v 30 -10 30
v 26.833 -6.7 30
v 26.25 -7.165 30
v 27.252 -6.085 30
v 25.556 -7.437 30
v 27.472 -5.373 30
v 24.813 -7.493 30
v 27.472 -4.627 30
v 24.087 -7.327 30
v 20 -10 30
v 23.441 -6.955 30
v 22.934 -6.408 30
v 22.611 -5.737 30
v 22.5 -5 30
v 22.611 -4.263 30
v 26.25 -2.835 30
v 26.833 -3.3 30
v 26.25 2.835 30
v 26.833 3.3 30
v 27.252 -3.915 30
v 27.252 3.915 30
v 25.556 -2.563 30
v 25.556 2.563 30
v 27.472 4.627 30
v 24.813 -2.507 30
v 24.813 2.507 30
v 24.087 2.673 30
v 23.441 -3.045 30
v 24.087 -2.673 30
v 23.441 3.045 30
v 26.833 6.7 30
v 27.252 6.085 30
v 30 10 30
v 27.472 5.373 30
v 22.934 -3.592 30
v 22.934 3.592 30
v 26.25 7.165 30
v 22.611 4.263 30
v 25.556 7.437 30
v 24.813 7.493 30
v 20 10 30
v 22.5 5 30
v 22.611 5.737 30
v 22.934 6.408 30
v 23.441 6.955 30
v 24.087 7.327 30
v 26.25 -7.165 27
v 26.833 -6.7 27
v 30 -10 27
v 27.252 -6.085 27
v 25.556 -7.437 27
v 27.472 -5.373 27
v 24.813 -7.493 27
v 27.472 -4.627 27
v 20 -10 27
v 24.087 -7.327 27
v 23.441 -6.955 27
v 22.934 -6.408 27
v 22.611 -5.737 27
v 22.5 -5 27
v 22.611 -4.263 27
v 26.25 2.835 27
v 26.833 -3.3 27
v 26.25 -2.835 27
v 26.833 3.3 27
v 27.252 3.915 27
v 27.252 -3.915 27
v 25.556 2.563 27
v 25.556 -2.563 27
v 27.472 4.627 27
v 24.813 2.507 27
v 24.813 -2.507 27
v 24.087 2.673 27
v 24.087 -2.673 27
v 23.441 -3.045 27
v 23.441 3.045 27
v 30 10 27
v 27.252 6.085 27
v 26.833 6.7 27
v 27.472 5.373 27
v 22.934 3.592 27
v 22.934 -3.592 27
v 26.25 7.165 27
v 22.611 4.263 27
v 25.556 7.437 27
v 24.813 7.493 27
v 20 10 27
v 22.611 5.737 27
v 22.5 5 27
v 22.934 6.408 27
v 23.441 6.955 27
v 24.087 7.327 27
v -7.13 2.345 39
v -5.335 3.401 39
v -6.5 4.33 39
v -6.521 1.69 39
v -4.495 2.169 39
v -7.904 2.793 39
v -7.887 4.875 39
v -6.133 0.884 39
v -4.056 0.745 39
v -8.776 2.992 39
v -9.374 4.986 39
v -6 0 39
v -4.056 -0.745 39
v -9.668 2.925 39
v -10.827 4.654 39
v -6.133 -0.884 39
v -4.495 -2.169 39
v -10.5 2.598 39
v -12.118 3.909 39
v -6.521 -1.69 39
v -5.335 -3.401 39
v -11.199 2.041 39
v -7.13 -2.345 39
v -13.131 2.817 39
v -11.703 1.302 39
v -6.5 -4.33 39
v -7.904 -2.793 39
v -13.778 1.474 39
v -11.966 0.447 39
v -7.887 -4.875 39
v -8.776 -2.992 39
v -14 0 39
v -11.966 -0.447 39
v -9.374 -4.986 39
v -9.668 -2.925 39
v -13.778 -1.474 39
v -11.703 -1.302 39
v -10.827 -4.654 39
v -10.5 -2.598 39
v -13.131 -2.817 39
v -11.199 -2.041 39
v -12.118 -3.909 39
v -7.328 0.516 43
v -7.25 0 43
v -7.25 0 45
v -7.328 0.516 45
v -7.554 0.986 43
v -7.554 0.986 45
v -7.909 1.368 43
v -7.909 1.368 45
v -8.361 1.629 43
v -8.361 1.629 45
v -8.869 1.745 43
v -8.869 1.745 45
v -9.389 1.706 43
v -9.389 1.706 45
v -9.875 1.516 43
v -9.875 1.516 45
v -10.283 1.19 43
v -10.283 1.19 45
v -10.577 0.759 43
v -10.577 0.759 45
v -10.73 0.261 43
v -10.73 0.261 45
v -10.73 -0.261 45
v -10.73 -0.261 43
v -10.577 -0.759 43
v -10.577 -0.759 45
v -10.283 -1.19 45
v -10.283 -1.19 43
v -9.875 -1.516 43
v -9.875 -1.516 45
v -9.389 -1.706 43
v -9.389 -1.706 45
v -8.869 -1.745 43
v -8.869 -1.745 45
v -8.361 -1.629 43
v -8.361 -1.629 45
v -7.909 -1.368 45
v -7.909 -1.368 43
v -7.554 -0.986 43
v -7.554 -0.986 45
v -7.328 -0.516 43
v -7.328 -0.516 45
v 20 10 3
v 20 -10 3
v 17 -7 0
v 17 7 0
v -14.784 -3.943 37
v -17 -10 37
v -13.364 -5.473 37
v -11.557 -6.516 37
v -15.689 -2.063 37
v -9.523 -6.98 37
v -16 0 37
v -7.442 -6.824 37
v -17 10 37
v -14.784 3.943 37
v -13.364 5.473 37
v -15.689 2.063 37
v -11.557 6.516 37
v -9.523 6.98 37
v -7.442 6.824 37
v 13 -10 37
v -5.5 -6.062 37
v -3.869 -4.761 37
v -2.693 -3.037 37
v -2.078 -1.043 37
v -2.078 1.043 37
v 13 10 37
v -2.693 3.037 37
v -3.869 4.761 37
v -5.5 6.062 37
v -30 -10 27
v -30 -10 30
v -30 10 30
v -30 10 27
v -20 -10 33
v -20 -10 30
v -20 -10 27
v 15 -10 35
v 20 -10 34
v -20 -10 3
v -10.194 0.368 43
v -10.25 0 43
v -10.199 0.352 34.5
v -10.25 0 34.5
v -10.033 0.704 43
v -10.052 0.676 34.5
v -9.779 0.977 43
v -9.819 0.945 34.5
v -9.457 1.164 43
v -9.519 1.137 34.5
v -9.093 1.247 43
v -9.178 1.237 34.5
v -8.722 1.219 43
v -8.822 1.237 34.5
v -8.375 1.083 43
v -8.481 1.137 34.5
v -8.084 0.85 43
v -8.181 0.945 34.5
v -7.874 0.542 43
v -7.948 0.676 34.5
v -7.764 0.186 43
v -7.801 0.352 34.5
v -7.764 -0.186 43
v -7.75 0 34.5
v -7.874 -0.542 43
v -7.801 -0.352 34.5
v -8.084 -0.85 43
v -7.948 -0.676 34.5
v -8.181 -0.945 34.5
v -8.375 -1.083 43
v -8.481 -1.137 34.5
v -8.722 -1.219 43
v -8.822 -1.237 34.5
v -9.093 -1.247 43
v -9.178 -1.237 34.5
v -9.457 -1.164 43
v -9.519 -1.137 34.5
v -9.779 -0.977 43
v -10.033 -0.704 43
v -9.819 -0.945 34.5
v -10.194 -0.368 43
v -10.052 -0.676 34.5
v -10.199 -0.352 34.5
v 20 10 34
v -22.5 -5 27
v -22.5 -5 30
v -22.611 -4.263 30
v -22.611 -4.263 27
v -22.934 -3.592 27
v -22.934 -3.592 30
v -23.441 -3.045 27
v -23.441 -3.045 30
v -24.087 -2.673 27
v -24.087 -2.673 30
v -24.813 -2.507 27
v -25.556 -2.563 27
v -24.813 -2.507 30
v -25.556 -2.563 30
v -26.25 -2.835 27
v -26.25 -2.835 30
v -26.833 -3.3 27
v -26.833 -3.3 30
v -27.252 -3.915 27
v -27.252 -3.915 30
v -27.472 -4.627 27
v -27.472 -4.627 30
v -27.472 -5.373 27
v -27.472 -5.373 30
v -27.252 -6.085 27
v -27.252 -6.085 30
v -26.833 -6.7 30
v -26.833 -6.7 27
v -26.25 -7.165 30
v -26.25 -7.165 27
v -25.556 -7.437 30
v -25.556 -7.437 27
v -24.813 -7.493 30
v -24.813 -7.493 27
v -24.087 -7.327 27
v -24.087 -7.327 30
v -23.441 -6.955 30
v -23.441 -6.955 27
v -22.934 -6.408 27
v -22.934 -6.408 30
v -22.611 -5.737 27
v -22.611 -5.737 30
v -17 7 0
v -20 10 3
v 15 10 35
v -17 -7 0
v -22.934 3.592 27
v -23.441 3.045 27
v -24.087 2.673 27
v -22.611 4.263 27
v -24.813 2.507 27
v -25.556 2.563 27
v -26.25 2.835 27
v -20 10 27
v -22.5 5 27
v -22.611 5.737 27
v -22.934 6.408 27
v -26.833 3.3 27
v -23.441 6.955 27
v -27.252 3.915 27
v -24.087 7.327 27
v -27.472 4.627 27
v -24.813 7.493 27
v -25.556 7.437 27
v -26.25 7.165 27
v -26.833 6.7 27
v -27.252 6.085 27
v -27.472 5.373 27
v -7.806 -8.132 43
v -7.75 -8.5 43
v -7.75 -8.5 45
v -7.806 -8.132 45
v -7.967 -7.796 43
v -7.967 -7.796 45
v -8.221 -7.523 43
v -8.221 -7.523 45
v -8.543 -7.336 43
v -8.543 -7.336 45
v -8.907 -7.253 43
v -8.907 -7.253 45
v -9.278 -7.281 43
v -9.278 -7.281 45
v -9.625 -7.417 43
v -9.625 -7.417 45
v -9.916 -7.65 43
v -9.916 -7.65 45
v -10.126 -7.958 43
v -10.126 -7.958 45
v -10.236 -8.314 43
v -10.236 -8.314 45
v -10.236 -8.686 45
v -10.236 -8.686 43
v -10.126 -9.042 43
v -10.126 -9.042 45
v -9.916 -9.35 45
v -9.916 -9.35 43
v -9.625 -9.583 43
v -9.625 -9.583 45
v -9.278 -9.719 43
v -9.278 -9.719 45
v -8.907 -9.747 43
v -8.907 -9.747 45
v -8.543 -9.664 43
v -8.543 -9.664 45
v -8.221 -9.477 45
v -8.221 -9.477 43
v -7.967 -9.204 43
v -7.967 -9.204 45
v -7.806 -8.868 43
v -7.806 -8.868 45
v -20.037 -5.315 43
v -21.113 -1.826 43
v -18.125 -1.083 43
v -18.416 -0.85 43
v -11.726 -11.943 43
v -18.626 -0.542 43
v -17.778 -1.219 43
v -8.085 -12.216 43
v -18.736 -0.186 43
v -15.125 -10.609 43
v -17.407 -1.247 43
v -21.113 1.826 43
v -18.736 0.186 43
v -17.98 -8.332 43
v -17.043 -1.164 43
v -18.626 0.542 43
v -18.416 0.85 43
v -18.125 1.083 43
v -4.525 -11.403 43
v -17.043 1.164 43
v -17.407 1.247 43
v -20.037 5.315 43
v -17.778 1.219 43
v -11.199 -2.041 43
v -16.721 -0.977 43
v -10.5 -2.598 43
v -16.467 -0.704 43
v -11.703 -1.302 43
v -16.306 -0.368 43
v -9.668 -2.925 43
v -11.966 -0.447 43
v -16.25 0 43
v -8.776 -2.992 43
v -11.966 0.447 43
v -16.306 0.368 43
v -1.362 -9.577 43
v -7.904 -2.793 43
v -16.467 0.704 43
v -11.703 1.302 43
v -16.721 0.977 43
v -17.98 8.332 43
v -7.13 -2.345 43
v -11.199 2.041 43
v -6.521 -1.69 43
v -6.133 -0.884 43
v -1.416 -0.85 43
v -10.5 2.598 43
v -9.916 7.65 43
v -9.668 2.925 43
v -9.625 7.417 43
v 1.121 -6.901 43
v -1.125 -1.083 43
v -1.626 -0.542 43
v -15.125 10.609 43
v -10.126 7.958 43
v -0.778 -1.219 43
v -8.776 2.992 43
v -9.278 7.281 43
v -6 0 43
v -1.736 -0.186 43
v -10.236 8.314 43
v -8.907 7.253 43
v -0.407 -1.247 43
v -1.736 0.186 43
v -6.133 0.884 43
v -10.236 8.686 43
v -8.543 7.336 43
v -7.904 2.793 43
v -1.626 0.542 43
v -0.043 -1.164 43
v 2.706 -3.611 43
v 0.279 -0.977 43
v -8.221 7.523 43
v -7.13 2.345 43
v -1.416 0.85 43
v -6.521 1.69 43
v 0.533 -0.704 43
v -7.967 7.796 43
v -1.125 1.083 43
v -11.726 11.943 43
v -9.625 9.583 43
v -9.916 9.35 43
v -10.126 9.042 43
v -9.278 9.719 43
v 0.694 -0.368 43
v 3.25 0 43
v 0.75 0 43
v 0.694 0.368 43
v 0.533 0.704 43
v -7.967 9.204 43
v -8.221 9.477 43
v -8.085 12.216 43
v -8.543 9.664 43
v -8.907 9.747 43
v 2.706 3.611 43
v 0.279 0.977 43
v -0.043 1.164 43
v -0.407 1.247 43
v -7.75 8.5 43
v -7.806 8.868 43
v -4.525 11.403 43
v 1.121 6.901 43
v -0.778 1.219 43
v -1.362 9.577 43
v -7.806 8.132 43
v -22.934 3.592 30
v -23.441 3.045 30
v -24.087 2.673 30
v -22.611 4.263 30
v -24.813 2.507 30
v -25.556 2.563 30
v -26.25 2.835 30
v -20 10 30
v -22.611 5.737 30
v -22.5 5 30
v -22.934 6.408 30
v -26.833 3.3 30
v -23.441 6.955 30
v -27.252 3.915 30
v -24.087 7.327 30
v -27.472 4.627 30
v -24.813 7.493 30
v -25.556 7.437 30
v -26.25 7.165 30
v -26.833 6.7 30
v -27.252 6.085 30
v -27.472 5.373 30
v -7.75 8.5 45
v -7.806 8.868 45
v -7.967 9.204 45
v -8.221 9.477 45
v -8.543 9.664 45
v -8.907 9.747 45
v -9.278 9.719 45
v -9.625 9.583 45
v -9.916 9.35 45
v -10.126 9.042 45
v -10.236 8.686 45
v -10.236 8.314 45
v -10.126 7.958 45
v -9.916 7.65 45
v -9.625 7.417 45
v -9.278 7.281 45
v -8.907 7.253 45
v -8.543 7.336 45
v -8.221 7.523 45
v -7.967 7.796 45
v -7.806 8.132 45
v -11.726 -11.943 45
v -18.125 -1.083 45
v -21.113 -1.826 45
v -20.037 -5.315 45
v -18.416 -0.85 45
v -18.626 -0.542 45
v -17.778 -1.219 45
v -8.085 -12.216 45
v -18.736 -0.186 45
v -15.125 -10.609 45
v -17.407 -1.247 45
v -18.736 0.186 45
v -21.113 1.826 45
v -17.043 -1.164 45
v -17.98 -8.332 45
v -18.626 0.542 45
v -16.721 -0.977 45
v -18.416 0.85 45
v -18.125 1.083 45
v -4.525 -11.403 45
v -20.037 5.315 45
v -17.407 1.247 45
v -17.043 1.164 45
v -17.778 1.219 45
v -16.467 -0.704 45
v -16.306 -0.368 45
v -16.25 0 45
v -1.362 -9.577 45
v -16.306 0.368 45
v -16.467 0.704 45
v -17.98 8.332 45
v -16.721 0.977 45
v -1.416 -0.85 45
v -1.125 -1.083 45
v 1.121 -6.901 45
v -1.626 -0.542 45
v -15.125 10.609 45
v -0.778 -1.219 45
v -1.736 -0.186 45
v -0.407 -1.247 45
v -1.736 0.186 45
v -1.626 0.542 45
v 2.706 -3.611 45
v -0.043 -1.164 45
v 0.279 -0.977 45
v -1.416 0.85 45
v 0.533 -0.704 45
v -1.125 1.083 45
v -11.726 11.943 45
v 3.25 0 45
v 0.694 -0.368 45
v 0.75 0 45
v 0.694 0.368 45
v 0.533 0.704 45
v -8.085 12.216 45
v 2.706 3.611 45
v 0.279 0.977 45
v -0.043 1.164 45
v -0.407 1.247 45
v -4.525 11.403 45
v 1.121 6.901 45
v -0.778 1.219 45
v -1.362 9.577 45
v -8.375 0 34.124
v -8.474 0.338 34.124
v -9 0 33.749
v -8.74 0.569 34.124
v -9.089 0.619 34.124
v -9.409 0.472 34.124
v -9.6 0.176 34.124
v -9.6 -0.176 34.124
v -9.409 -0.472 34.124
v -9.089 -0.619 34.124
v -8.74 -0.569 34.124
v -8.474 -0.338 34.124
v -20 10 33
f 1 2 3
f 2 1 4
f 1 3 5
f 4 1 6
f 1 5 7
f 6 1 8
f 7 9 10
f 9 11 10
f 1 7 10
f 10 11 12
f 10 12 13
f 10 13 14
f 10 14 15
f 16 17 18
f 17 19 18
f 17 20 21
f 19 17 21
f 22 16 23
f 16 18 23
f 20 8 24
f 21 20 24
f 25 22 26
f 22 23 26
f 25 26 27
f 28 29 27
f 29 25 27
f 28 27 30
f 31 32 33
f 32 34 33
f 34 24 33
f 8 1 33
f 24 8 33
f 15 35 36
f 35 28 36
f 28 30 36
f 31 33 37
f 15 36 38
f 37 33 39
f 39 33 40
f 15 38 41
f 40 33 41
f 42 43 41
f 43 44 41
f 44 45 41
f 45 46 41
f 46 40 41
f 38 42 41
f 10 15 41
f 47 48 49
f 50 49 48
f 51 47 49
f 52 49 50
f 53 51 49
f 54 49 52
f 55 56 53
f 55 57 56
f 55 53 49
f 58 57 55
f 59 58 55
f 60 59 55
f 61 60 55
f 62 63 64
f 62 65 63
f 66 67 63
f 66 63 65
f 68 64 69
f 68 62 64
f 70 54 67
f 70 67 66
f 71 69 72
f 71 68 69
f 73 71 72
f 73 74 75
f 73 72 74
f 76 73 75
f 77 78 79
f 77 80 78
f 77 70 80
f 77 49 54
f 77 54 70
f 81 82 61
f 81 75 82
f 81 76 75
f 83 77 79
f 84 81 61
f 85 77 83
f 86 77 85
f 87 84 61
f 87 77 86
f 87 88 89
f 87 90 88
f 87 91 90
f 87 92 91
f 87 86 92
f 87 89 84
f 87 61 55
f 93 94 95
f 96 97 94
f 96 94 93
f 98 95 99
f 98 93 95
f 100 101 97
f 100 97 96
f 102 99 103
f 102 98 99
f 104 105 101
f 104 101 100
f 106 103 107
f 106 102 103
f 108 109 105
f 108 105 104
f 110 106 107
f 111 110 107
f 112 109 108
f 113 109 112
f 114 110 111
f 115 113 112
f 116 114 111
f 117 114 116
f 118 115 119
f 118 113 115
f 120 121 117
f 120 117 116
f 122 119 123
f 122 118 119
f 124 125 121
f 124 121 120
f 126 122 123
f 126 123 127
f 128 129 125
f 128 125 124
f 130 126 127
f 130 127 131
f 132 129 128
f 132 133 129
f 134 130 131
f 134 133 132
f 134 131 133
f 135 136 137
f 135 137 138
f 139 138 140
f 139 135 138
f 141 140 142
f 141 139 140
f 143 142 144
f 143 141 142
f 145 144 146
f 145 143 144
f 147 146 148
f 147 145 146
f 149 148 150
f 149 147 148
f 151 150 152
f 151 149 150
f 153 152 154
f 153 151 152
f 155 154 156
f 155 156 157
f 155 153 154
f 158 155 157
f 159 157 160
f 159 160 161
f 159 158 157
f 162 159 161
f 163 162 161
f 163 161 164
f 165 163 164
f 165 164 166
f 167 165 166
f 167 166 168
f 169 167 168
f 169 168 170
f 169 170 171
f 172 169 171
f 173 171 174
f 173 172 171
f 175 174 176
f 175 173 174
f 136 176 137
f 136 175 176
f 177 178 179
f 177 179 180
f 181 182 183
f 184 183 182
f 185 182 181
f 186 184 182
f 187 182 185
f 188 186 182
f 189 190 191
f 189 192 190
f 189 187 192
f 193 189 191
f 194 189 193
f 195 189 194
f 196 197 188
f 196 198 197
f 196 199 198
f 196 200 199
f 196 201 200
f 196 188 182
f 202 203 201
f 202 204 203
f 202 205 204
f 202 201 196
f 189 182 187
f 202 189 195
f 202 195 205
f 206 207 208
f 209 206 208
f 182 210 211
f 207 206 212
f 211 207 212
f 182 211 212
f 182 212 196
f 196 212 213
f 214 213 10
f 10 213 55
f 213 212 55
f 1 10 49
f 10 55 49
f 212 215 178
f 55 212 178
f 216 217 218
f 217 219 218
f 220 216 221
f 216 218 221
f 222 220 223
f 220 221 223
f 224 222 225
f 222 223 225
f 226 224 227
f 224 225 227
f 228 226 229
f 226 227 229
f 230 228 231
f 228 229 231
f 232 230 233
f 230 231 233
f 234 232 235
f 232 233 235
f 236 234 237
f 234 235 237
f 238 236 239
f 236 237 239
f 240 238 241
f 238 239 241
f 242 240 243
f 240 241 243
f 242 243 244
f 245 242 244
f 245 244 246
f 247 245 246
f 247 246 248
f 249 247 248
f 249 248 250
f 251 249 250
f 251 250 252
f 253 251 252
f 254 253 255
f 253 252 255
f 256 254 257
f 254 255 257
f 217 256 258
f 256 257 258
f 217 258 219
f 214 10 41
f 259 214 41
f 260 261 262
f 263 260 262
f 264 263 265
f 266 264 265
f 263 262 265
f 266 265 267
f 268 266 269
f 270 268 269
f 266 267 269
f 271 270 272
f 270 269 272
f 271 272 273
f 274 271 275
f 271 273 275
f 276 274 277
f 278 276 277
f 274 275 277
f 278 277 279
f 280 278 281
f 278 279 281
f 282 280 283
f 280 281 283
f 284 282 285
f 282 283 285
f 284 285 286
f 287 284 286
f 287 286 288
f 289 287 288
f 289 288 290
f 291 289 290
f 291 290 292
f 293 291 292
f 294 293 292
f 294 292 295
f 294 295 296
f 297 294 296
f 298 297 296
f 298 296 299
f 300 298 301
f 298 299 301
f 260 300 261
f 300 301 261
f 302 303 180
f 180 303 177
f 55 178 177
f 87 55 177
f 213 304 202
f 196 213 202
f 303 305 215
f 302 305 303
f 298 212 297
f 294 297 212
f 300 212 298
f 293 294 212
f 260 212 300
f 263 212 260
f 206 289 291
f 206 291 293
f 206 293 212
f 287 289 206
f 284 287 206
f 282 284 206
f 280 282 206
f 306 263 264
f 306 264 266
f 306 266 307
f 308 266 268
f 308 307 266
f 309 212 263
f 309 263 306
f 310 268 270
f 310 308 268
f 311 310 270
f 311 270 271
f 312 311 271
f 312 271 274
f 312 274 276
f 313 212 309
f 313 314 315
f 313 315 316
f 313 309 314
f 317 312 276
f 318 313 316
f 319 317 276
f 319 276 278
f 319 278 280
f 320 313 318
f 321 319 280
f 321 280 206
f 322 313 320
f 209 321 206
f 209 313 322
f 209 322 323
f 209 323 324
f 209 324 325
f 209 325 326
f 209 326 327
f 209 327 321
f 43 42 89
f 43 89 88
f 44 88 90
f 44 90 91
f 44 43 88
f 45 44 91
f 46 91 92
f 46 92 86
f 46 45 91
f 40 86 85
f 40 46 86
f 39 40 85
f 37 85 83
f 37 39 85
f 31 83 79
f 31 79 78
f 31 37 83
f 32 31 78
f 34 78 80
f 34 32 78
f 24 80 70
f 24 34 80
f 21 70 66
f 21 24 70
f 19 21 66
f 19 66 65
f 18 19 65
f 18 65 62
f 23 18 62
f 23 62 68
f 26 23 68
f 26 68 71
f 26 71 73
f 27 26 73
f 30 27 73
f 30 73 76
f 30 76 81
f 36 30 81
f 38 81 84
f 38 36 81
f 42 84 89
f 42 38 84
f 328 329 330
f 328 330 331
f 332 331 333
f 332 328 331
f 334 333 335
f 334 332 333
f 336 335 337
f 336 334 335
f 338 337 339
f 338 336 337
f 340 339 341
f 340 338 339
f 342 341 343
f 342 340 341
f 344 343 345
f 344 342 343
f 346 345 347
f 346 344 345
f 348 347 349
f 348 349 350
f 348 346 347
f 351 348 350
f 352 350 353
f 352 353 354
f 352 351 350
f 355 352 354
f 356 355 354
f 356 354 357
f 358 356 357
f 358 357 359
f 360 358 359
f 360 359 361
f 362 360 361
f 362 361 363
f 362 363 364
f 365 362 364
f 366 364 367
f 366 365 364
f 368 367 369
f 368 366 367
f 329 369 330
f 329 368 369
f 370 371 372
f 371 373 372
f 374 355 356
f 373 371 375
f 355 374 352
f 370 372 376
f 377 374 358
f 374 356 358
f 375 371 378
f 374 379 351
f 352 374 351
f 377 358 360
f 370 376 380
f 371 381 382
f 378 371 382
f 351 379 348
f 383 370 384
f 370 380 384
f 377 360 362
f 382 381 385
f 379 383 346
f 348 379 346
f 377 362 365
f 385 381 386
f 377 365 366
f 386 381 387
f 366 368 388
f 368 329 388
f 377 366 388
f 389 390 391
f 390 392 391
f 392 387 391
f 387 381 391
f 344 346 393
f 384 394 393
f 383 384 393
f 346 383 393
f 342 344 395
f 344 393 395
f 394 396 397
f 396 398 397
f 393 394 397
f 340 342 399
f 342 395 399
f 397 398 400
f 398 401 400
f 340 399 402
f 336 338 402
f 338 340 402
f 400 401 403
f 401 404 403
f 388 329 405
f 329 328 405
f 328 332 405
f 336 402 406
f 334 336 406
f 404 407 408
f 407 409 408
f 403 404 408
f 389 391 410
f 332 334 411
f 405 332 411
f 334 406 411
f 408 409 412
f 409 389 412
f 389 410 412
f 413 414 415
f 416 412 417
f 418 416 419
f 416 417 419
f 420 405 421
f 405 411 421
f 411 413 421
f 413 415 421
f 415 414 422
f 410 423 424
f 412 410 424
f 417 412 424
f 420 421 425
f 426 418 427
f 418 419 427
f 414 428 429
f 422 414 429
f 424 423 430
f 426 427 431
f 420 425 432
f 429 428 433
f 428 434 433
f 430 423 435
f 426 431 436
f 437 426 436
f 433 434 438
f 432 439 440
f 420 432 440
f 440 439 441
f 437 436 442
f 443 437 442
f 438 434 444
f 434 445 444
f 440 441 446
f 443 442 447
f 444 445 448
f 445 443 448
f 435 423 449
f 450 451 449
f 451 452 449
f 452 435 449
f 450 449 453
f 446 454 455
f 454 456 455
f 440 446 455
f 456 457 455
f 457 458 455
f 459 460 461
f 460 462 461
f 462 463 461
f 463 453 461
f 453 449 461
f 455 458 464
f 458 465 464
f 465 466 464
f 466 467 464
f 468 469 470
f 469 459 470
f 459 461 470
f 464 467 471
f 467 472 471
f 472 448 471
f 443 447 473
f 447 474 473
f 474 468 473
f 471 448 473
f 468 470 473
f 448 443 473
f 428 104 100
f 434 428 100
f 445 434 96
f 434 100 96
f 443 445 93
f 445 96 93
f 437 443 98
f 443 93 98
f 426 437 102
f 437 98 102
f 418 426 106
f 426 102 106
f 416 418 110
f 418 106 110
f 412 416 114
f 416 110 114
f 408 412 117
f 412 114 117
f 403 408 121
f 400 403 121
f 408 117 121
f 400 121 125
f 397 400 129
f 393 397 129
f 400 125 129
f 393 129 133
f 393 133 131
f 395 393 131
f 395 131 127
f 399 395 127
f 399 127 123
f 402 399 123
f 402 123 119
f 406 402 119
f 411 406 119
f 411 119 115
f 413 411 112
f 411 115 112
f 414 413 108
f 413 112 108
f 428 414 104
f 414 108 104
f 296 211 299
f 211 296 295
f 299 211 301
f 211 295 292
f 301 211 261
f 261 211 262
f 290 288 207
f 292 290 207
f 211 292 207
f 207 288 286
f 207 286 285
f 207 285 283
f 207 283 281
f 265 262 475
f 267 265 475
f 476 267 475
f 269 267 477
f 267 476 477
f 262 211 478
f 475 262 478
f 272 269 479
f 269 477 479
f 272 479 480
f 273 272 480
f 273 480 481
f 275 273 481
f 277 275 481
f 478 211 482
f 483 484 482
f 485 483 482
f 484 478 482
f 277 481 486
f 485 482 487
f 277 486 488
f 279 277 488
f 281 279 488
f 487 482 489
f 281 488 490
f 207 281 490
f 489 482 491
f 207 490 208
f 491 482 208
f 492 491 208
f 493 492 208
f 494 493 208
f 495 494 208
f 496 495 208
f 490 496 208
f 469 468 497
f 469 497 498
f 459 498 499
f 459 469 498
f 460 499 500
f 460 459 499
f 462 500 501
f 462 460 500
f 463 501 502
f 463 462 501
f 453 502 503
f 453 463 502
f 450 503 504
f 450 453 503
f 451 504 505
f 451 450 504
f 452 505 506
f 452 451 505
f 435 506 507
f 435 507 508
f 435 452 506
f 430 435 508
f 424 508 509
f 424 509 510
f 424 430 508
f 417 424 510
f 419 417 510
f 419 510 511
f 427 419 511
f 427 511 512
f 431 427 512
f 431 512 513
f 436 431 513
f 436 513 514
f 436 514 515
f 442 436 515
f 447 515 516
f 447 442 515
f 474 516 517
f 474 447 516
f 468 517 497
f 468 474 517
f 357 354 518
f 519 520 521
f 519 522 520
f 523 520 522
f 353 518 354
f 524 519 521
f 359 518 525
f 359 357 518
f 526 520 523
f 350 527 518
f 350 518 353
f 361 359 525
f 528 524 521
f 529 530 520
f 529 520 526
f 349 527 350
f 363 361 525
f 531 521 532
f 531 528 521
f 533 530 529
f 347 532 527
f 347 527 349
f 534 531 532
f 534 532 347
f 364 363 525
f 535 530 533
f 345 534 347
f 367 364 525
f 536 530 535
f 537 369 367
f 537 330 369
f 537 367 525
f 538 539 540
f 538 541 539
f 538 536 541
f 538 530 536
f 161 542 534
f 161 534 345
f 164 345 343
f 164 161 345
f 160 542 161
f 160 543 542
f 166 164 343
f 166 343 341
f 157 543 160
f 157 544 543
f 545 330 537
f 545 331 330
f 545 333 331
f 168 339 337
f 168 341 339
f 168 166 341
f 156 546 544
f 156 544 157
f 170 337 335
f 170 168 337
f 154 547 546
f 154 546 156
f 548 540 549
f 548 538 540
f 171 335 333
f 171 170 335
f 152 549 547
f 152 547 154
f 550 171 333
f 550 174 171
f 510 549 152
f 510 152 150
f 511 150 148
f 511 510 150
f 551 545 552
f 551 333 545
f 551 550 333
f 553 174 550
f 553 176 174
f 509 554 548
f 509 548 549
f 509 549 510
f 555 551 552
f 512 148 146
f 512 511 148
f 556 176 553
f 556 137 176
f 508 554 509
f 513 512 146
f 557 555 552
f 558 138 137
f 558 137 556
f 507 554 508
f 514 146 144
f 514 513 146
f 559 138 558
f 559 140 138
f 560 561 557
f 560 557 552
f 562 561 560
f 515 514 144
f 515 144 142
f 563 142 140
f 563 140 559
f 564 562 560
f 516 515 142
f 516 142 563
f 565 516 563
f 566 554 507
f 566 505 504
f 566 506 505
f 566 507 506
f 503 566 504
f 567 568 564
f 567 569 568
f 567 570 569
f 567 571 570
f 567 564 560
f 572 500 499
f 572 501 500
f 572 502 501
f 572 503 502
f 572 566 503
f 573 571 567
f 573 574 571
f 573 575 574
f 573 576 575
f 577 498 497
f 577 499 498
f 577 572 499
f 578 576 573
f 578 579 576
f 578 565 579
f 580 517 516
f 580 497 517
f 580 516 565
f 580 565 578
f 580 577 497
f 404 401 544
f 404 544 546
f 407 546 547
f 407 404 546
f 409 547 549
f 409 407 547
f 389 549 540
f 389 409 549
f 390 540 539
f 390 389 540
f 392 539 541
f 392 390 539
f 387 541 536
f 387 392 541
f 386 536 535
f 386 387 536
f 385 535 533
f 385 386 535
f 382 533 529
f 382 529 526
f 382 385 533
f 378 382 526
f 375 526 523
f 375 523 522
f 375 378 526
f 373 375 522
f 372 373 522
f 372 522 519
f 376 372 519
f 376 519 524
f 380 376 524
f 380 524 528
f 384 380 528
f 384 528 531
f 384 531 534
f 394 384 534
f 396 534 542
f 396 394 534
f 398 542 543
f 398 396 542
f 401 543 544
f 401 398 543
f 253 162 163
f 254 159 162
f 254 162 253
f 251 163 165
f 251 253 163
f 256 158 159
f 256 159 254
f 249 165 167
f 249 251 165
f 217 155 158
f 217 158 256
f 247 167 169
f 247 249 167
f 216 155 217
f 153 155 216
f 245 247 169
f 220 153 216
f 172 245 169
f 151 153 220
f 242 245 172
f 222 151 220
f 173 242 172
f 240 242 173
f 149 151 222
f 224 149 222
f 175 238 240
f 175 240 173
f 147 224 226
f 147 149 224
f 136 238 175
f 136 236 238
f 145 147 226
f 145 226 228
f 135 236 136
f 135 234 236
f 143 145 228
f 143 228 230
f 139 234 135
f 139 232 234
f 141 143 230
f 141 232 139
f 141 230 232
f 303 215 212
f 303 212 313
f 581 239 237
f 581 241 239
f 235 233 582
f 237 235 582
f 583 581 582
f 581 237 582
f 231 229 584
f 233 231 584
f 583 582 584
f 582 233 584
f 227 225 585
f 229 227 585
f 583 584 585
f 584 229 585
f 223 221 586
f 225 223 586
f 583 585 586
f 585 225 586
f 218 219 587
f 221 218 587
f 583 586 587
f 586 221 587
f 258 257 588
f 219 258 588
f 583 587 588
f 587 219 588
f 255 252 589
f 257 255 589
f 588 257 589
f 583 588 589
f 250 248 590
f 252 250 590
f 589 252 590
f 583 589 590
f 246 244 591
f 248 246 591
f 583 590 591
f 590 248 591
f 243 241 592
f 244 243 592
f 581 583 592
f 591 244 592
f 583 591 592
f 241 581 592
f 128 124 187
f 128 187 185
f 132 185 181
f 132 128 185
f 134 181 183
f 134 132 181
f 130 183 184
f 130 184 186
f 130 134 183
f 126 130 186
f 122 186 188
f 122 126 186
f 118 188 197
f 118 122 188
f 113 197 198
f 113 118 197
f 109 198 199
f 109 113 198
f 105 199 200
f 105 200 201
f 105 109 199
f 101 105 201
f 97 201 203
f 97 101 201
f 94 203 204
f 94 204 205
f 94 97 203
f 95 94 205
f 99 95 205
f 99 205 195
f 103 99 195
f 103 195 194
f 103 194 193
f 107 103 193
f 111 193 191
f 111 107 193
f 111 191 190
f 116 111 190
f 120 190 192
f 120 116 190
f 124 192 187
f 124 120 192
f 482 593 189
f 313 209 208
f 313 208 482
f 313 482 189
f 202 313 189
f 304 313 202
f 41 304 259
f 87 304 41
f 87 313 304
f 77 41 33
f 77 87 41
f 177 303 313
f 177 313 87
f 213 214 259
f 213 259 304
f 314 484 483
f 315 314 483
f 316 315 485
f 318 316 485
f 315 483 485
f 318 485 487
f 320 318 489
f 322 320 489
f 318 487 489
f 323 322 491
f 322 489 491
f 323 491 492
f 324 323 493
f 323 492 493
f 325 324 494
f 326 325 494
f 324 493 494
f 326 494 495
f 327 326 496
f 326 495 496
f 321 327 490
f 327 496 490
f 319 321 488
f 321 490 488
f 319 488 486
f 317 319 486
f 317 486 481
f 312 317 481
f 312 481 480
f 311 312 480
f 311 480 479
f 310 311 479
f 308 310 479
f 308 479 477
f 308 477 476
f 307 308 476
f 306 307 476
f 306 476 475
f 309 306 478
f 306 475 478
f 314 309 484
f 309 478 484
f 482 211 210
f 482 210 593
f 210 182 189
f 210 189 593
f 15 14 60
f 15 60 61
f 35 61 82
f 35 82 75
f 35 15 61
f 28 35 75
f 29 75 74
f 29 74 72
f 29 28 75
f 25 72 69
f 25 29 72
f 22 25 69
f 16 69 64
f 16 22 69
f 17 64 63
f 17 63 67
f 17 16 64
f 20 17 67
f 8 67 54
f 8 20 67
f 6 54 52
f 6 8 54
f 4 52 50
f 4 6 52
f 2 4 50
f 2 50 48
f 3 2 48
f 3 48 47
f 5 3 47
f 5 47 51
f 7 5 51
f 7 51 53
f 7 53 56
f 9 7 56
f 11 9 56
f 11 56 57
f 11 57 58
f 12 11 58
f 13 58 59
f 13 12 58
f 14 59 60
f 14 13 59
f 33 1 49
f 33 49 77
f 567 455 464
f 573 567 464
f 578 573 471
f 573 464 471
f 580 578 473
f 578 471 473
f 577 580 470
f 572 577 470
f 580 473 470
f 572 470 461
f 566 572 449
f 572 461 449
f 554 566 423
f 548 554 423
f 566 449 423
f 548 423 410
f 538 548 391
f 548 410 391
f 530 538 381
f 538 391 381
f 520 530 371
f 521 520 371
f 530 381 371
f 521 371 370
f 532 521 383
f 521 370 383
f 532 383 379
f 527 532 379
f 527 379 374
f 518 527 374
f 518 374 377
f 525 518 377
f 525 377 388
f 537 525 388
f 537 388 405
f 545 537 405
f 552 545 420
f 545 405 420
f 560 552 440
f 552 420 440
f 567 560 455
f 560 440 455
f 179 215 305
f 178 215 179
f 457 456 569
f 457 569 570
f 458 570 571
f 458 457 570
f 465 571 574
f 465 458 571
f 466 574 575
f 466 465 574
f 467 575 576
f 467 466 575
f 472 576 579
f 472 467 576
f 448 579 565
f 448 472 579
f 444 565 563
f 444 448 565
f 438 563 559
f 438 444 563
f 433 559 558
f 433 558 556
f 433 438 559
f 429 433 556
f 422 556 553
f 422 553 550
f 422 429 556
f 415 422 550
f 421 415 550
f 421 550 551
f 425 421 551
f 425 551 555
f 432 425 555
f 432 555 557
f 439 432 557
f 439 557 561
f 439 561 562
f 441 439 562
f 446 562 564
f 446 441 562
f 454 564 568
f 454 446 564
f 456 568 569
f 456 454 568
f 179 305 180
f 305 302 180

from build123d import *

# Parameters (mm, degrees)
SKETCH_1_W             = 40
SKETCH_1_H             = 20
EXTRUDE_1_DEPTH        = 37
CUT_EXTRUDE_1_DEPTH    = 47.572524089
CUT_EXTRUDE_2_DEPTH    = 47.572524089
CHAMFER_1_SIZE         = 3
SKETCH_4_R             = 7
EXTRUDE_2_DEPTH        = 2
CHAMFER_2_SIZE         = 2
SKETCH_5_R             = 3
EXTRUDE_3_DEPTH        = 4
SKETCH_6_W             = 10
SKETCH_6_H             = 20
EXTRUDE_4_DEPTH        = 3
SKETCH_7_R             = 2.5
CUT_EXTRUDE_3_DEPTH    = 3
HOLE_WIZARD_M3_1_D     = 2.5
HOLE_WIZARD_M3_1_DEPTH = 8.5
HOLE_WIZARD_M3_1_TIP   = 0.751075774
SKETCH_10_R            = 12.25
SKETCH_10_R_2          = 1.25
SKETCH_10_R_3          = 1.75
EXTRUDE_5_DEPTH        = 2


with BuildPart() as part:
    # 草图1 → 凸台-拉伸1 (new body)
    with BuildSketch(Plane.XY):
        Rectangle(SKETCH_1_W, SKETCH_1_H)
    extrude(amount=EXTRUDE_1_DEPTH)

    # 草图2 → 切除-拉伸1 (cut, through all)
    with BuildSketch(Plane.XZ.offset(10)):
        Polygon((20, 34), (15, 35), (13, 37), (20, 37), align=None)
    extrude(amount=-CUT_EXTRUDE_1_DEPTH, mode=Mode.SUBTRACT)

    # 草图3 → 切除-拉伸2 (cut, through all)
    with BuildSketch(Plane.XZ.offset(10)):
        Polygon((-20, 37), (-17, 37), (-20, 33), align=None)
    extrude(amount=-CUT_EXTRUDE_2_DEPTH, mode=Mode.SUBTRACT)

    # 倒角1
    chamfer_1_edges = [part.edges().sort_by_distance(p)[0] for p in [
        (0, -10, 0),
        (-20, 0, 0),
        (0, 10, 0),
        (20, 0, 0),
    ]]
    chamfer(chamfer_1_edges, length=CHAMFER_1_SIZE)

    # 草图4 → 凸台-拉伸2 (add)
    with BuildSketch(Plane.XY.offset(37)):
        with Locations(Location((-9, 0, 0), (0, 0, 180))):
            Circle(SKETCH_4_R)
    extrude(amount=EXTRUDE_2_DEPTH)

    # 倒角2
    chamfer_2_edges = [part.edges().sort_by_distance(p)[0] for p in [
        (-2, 0, 39),
    ]]
    chamfer(chamfer_2_edges, length=CHAMFER_2_SIZE - 0.0001)  # a hair under: the kernel refuses the full size

    # 草图5 → 凸台-拉伸3 (add)
    with BuildSketch(Plane.XY.offset(39)):
        with Locations((-9, 0)):
            Circle(SKETCH_5_R)
    extrude(amount=EXTRUDE_3_DEPTH)

    # 草图6 → 凸台-拉伸4 (add)
    with BuildSketch(Plane(origin=(0, 0, 30), x_dir=(-1, 0, 0), z_dir=(0, 0, -1))):
        with Locations((25, 0)):
            Rectangle(SKETCH_6_W, SKETCH_6_H)
        with Locations((-25, 0)):
            Rectangle(SKETCH_6_W, SKETCH_6_H)
    extrude(amount=EXTRUDE_4_DEPTH)

    # 草图7 → 切除-拉伸3 (cut)
    with BuildSketch(Plane.XY.offset(30)):
        with Locations((-25, 5)):
            Circle(SKETCH_7_R)
        with Locations((-25, -5)):
            Circle(SKETCH_7_R)
    cut_extrude_3 = extrude(amount=-CUT_EXTRUDE_3_DEPTH, mode=Mode.SUBTRACT)

    # 镜向1: 切除-拉伸3 across plane
    add(cut_extrude_3.mirror(Plane(origin=(0, 0, 0), x_dir=(0, 0, 1), z_dir=(1, 0, 0))), mode=Mode.SUBTRACT)

    # M3 螺纹孔1
    with Locations(Plane.XY.offset(43)):
        with Locations((-9, 0)):
            Hole(HOLE_WIZARD_M3_1_D / 2, depth=HOLE_WIZARD_M3_1_DEPTH)
            with Locations((0, 0, -(HOLE_WIZARD_M3_1_DEPTH + HOLE_WIZARD_M3_1_TIP / 2))):  # 118° drill point
                Cone(0, HOLE_WIZARD_M3_1_D / 2, HOLE_WIZARD_M3_1_TIP, mode=Mode.SUBTRACT)

    # 草图10 → 凸台-拉伸5 (add)
    with BuildSketch(Plane.XY.offset(43)):
        with Locations((-9, 0)):
            Circle(SKETCH_10_R)
        with Locations((-9, 8.5)):
            Circle(SKETCH_10_R_2, mode=Mode.SUBTRACT)
        with Locations((-0.5, 0)):
            Circle(SKETCH_10_R_2, mode=Mode.SUBTRACT)
        with Locations((-9, -8.5)):
            Circle(SKETCH_10_R_2, mode=Mode.SUBTRACT)
        with Locations((-17.5, 0)):
            Circle(SKETCH_10_R_2, mode=Mode.SUBTRACT)
        with Locations((-9, 0)):
            Circle(SKETCH_10_R_3, mode=Mode.SUBTRACT)
    extrude(amount=EXTRUDE_5_DEPTH)


solid = part.part
